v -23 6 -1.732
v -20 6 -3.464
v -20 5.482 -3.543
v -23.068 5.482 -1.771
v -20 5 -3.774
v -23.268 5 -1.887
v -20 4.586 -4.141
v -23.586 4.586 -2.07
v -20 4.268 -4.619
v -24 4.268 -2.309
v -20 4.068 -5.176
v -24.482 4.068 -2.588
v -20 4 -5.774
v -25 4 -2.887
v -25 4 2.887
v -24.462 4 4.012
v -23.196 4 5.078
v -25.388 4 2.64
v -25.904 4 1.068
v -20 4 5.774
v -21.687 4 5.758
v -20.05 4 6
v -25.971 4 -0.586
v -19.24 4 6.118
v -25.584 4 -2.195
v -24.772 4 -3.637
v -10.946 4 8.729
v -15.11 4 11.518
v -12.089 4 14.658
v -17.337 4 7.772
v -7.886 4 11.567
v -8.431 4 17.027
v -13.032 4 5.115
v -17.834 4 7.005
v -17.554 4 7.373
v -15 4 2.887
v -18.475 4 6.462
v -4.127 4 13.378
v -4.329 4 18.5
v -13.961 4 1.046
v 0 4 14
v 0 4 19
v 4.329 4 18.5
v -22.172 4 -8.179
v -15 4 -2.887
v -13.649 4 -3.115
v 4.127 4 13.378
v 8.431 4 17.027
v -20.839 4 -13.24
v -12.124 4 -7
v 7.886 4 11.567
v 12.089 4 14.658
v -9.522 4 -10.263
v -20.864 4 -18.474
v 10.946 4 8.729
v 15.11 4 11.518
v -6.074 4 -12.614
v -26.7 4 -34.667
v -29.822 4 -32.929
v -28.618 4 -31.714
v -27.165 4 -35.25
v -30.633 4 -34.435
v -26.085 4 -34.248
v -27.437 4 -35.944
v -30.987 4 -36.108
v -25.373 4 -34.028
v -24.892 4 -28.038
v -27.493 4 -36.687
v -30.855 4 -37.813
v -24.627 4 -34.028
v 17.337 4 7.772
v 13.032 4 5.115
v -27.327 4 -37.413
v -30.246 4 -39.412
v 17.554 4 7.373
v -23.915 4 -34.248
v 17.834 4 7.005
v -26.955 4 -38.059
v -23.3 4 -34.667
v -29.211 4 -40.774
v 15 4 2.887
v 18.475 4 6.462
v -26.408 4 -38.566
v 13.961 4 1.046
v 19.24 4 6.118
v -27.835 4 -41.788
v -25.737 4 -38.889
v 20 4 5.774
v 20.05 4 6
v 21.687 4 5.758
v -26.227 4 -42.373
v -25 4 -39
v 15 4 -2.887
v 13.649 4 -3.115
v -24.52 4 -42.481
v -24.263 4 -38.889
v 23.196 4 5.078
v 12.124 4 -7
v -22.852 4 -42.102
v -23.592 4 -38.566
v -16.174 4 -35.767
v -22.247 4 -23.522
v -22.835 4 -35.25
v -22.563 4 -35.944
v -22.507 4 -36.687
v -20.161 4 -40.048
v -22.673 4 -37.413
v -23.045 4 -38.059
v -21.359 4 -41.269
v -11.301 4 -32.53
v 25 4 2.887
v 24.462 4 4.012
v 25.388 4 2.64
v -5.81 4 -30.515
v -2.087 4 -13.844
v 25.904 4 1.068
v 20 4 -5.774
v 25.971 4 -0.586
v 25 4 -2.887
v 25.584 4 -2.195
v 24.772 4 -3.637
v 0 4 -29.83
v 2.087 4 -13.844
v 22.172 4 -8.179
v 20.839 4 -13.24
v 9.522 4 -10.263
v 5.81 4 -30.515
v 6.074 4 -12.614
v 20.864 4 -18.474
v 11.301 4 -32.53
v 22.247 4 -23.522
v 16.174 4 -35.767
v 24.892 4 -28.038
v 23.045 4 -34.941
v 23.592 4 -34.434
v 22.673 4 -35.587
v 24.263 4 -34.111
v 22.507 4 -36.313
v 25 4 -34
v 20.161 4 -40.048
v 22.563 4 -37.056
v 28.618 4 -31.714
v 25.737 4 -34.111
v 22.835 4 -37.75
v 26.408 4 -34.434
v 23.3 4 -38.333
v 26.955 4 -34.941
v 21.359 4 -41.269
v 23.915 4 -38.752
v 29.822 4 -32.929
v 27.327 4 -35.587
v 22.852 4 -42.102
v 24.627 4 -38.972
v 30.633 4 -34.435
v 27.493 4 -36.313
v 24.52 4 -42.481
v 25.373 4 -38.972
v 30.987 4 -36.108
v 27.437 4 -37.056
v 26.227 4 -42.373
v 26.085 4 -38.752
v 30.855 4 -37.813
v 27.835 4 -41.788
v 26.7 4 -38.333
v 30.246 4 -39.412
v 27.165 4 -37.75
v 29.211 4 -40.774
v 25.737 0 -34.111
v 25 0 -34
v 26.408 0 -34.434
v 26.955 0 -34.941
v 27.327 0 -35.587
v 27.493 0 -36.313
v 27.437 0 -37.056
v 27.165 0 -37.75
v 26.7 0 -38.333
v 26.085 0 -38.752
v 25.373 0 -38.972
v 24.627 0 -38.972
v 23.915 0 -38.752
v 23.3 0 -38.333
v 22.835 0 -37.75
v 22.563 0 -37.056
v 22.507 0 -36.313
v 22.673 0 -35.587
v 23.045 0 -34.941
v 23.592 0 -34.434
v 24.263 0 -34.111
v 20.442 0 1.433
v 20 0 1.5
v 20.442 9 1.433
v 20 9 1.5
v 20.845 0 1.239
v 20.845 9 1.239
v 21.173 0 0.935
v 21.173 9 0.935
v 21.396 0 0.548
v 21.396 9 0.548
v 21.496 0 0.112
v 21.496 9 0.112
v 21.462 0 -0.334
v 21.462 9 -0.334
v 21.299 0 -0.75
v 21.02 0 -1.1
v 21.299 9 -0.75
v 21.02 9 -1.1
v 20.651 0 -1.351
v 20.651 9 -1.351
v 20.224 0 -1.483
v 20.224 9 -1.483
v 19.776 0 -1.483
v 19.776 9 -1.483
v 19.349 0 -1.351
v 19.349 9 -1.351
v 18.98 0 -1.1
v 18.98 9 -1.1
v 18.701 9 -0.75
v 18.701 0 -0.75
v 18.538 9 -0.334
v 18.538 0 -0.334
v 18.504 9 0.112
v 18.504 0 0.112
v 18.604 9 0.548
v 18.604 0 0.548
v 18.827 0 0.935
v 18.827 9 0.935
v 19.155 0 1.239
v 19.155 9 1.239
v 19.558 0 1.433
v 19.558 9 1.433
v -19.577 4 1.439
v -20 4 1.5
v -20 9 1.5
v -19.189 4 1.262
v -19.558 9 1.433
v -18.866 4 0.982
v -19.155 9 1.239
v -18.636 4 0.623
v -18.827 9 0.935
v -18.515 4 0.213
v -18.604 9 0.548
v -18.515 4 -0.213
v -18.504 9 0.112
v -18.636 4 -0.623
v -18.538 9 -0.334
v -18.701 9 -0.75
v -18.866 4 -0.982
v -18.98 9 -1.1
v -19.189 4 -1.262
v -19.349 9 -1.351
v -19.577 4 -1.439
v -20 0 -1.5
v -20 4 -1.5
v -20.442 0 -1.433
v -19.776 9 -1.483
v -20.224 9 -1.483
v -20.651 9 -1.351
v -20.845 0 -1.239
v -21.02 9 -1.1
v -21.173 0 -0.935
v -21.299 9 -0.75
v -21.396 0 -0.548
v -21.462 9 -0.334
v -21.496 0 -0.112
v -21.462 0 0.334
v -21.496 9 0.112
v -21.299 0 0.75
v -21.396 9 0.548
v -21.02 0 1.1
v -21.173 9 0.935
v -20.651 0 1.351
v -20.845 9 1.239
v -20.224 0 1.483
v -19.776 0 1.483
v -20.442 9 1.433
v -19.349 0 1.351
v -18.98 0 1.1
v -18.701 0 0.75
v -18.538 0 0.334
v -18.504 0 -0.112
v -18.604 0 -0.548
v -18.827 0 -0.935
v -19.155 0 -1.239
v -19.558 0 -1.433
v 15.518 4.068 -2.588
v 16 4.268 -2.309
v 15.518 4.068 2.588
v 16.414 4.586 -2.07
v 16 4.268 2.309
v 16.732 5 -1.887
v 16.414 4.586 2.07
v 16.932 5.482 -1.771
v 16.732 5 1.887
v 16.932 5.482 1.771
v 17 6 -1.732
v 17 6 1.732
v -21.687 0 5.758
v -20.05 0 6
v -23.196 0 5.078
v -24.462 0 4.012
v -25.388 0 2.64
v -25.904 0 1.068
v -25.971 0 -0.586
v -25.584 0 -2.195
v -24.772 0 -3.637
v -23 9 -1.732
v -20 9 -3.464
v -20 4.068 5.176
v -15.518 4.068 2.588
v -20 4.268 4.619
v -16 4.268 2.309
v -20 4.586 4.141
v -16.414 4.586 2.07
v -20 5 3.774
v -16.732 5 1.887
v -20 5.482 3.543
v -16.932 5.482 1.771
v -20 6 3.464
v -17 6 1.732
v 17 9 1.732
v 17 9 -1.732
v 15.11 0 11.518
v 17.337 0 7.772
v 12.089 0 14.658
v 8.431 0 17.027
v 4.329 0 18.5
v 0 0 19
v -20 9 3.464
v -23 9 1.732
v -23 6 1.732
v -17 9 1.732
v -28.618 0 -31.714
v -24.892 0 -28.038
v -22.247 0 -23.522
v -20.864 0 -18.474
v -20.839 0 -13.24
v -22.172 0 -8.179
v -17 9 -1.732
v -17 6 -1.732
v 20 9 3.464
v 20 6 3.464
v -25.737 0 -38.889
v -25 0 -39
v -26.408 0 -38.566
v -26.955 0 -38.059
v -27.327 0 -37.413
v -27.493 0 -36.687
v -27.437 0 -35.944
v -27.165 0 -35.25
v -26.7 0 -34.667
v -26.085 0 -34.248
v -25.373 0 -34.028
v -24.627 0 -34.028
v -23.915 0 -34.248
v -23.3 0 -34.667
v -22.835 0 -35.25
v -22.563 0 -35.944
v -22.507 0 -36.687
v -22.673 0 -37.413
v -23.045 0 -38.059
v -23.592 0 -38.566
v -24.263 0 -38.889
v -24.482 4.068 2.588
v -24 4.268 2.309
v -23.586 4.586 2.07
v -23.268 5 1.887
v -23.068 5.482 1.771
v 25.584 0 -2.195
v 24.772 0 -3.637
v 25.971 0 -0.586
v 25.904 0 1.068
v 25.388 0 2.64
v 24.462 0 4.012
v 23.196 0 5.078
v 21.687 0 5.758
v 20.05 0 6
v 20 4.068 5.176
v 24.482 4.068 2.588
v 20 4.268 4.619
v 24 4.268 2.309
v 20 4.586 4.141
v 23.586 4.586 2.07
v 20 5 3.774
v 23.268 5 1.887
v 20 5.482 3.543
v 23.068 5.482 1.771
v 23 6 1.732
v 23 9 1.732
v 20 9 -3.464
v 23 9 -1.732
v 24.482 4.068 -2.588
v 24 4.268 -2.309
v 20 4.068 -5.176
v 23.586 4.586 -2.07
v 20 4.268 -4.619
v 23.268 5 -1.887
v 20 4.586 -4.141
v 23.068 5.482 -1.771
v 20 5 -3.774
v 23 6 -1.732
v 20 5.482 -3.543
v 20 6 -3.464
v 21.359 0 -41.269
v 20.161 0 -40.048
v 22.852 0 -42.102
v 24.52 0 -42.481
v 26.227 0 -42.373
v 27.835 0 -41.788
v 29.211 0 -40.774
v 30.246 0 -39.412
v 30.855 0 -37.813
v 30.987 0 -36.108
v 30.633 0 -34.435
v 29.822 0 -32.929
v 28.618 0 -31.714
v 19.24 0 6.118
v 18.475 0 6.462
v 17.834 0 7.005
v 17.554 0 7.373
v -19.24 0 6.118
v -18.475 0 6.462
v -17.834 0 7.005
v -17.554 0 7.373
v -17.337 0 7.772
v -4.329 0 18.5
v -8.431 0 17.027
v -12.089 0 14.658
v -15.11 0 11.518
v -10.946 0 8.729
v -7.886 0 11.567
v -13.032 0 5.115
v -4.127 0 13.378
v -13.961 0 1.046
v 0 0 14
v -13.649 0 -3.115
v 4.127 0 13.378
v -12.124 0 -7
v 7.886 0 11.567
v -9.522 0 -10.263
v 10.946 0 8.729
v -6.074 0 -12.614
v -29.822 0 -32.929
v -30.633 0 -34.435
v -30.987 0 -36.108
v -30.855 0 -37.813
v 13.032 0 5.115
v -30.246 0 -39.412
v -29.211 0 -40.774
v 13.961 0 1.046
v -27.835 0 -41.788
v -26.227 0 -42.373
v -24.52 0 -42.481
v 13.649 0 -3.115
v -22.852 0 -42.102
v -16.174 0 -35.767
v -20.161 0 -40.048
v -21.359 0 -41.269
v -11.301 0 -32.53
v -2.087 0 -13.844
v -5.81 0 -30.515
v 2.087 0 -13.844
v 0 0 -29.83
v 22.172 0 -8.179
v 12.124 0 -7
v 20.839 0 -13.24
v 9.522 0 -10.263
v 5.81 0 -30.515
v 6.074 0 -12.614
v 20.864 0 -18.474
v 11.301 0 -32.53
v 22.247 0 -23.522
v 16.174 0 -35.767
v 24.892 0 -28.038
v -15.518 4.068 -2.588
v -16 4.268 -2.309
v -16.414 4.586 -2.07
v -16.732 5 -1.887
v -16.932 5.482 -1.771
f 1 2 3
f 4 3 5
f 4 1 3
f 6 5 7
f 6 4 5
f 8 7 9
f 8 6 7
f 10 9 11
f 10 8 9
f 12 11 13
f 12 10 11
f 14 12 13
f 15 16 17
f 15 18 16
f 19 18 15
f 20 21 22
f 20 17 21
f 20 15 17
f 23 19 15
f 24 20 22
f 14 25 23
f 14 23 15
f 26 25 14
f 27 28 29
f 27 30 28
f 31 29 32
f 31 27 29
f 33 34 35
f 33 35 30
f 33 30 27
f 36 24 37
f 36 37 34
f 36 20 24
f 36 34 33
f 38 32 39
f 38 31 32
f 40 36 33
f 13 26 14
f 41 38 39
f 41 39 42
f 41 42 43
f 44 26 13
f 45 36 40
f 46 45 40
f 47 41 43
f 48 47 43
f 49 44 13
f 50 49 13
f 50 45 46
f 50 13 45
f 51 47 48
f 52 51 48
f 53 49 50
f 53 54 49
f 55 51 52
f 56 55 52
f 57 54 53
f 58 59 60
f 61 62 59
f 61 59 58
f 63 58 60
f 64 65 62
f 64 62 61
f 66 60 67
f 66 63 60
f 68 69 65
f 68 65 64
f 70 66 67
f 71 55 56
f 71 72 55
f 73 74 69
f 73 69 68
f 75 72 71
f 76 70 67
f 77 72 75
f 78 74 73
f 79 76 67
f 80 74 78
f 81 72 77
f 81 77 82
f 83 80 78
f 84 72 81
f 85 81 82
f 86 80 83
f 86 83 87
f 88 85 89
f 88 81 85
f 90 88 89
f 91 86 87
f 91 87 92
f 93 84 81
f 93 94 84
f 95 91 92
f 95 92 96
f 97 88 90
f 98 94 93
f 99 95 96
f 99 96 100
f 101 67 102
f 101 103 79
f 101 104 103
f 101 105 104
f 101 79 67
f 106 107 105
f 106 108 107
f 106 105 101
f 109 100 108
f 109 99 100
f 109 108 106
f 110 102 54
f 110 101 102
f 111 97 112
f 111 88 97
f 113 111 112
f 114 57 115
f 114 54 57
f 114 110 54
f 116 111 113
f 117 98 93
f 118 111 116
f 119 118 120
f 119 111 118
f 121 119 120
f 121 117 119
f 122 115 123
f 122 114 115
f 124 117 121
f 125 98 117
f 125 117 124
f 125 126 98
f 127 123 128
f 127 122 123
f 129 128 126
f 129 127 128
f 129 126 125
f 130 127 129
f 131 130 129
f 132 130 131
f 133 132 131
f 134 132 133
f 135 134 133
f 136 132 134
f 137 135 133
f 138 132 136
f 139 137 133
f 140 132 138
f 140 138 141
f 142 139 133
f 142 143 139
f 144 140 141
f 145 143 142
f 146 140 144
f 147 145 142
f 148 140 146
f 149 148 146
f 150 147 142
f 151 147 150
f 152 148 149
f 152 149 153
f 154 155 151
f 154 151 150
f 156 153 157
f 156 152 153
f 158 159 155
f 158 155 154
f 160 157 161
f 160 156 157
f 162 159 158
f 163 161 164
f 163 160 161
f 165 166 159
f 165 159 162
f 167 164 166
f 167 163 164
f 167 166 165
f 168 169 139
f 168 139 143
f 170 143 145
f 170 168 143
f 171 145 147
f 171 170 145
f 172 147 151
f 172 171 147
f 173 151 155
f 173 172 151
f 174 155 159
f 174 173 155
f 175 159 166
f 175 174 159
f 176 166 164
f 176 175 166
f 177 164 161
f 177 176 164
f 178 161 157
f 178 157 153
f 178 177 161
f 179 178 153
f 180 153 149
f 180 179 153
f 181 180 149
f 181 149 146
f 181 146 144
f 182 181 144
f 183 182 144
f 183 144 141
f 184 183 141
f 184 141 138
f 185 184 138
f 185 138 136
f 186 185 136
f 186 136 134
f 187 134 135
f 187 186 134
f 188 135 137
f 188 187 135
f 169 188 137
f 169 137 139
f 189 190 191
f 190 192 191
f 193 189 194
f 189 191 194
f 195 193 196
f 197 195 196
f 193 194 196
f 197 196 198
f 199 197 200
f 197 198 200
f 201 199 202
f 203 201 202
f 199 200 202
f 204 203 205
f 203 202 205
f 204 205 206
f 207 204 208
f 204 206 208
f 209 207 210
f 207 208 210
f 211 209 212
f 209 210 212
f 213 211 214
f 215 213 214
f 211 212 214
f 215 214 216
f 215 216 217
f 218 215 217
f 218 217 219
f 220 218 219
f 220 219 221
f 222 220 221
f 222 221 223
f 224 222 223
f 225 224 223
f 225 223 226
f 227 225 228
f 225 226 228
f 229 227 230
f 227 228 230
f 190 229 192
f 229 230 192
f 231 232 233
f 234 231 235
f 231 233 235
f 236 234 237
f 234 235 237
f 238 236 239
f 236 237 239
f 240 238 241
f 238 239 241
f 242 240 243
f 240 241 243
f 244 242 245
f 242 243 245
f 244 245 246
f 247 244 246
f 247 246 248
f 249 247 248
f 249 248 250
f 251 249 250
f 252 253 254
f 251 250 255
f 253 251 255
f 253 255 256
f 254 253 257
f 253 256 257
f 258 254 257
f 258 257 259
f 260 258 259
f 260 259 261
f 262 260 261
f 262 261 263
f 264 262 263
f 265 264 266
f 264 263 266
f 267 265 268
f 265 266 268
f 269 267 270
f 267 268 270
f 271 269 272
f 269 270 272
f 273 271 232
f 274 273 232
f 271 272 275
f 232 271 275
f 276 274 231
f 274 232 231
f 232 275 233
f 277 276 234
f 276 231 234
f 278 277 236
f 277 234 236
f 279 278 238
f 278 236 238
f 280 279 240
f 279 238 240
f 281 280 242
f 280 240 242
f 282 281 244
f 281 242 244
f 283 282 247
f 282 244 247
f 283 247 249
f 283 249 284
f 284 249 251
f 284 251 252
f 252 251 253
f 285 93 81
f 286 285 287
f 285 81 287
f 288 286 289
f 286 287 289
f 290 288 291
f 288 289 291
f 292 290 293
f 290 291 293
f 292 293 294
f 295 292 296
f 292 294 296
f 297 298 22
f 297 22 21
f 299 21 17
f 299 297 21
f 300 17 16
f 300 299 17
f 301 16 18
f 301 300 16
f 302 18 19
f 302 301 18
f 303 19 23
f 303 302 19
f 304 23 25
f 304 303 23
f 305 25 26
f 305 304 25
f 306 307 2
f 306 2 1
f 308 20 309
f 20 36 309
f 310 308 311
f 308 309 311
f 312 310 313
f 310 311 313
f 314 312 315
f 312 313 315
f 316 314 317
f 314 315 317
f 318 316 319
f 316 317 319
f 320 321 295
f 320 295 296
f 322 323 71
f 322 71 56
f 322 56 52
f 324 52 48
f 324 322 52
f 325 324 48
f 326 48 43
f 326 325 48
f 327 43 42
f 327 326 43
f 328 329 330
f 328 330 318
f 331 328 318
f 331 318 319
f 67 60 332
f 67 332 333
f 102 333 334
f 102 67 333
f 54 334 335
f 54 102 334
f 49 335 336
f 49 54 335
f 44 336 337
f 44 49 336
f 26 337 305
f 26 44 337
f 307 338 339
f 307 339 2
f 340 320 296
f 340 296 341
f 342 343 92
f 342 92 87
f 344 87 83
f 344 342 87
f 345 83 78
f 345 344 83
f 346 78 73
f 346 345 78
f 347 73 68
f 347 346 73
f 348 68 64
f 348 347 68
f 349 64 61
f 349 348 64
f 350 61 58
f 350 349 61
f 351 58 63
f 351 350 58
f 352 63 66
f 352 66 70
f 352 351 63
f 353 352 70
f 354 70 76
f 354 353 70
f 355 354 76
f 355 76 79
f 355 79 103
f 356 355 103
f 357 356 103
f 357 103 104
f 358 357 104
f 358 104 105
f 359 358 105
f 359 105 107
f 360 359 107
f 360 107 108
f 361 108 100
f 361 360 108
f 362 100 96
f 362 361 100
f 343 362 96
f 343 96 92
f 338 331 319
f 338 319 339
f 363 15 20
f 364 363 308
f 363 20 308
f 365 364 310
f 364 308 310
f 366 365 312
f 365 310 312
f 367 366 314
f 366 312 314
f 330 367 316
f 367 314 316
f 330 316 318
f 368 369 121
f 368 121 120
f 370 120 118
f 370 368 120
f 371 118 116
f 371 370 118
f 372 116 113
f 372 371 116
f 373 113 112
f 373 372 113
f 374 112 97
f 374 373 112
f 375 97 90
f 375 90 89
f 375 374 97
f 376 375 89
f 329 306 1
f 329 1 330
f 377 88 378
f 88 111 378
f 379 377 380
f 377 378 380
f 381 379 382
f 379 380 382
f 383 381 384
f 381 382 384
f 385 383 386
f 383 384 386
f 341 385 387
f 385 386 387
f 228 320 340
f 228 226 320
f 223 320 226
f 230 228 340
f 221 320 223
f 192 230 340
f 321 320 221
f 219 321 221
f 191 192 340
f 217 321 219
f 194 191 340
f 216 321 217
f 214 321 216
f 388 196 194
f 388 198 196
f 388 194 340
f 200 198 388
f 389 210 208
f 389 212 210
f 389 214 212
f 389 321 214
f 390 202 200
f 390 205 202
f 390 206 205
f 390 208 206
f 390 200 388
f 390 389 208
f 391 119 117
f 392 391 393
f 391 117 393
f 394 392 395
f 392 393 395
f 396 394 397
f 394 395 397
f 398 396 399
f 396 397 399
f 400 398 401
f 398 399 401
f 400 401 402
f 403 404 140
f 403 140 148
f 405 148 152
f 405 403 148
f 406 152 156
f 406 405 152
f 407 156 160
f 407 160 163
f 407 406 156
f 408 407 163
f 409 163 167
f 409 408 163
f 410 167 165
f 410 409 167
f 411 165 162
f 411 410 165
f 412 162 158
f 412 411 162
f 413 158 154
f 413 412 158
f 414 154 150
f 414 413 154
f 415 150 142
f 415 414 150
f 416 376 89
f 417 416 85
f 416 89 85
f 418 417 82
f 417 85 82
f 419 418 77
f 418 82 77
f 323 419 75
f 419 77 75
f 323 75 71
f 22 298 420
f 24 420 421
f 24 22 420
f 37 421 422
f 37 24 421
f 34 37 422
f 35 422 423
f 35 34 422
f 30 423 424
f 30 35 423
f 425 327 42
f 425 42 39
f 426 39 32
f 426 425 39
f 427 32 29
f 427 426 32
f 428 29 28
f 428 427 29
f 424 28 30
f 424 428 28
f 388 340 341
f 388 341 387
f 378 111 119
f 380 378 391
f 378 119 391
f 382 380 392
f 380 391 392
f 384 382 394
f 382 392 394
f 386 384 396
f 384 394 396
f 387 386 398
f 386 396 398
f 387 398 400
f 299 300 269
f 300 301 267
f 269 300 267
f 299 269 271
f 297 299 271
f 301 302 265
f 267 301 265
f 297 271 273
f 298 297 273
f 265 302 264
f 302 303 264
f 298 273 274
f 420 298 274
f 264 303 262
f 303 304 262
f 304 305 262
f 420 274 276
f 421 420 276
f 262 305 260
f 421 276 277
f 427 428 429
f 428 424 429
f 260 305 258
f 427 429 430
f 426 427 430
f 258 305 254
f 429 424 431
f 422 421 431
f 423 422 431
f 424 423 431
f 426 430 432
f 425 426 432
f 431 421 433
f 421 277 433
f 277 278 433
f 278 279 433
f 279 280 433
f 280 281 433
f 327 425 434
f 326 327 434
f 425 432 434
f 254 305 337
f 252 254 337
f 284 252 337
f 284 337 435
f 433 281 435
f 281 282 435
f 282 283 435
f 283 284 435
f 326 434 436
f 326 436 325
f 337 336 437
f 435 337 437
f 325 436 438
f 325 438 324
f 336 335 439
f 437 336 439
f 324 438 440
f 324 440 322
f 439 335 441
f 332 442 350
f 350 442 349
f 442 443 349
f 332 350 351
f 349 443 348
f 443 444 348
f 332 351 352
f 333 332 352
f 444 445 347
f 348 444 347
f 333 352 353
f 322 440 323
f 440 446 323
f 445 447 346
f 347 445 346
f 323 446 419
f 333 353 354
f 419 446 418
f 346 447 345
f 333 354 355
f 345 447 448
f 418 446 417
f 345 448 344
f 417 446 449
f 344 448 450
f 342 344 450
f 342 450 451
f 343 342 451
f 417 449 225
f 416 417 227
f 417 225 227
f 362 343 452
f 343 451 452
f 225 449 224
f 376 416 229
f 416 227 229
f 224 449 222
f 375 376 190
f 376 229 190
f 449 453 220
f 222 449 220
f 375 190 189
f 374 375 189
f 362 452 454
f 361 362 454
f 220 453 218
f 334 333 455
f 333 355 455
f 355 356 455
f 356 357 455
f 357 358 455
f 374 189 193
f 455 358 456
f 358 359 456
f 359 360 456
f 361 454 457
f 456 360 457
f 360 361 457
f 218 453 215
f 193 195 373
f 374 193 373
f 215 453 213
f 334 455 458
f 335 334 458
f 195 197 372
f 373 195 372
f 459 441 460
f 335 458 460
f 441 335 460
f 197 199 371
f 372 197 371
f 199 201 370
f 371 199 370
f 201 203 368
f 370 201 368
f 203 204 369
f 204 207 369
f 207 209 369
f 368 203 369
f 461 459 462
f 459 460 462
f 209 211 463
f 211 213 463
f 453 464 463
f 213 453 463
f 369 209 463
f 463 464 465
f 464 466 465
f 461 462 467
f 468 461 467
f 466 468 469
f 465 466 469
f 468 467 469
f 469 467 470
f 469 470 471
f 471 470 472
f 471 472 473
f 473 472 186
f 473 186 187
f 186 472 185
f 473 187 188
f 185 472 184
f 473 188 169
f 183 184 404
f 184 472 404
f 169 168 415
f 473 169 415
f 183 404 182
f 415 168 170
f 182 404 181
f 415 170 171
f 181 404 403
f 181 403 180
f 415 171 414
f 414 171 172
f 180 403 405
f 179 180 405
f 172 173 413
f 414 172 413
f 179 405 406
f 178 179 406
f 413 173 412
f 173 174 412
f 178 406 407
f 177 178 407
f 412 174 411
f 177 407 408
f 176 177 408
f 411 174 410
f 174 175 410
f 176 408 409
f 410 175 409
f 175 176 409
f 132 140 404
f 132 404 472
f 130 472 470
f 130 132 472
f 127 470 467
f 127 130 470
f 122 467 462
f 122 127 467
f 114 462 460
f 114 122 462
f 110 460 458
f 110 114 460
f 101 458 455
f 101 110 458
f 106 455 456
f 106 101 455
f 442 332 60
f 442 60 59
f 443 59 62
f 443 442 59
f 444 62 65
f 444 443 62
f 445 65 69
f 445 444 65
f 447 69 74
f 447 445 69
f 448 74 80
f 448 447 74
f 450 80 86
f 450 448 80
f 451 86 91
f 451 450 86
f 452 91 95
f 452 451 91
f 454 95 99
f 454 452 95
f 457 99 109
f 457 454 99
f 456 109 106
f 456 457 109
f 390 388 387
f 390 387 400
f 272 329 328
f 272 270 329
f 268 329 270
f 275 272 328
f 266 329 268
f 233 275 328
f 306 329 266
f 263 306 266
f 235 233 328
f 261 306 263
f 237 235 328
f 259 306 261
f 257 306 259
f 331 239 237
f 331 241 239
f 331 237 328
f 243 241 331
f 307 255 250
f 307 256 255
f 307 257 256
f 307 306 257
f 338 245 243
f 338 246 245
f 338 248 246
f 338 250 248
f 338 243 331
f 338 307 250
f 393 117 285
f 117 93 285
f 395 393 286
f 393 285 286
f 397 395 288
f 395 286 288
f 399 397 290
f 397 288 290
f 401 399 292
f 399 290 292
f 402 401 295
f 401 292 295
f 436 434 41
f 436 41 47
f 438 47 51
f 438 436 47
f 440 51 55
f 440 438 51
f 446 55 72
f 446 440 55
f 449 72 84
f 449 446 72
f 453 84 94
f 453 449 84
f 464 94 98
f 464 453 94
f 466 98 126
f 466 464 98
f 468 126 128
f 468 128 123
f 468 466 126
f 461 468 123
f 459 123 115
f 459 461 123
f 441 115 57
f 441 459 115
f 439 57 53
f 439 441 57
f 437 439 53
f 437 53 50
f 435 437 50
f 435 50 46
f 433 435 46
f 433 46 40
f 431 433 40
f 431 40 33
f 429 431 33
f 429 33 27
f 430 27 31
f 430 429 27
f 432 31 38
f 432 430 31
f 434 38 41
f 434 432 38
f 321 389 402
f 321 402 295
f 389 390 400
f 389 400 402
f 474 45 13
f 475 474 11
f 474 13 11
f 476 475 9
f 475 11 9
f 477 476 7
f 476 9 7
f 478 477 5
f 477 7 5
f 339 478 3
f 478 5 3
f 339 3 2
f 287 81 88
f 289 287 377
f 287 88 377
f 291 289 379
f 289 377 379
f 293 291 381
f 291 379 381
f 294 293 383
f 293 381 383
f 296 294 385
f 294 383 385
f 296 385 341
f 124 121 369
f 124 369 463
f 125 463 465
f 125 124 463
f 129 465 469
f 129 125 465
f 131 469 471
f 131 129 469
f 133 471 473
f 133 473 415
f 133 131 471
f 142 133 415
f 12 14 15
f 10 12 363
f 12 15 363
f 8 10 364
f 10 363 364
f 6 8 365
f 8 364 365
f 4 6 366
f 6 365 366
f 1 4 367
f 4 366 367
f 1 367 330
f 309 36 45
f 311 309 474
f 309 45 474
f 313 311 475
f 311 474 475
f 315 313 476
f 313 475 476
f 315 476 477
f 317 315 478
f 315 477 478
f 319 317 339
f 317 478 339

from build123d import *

# Parameters (mm, degrees)
SKETCH1_R           = 14
SKETCH1_R_2         = 2.5
BOSS_EXTRUDE1_DEPTH = 4
FILLET1_R           = 3
SKETCH2_R           = 1.5
CUT_EXTRUDE1_DEPTH  = 10
BOSS_EXTRUDE2_START = 5
SKETCH3_R           = 1.5
BOSS_EXTRUDE2_DEPTH = 5
FILLET2_R           = 2
BOSS_EXTRUDE3_DEPTH = 4


with BuildPart() as part:
    # Sketch1 → Boss-Extrude1 (new body)
    with BuildSketch(Plane(origin=(0, 0, 0), x_dir=(1, 0, 0), z_dir=(0, 1, 0))):
        with BuildLine():
            Line((8.126919667, 17.174200905), (19.588621549, 33.908285652))
            ThreePointArc((19.588621549, 33.908285652), (28.390534034, 41.45017969), (24.538801239, 30.517751618))
            Line((24.538801239, 30.517751618), (13.077099357, 13.783666871))
            ThreePointArc((13.077099357, 13.783666871), (16.116177061, 10.06324187), (18.125, 5.699506558))
            ThreePointArc((18.125, 5.699506558), (26, 0), (18.125, -5.699506558))
            ThreePointArc((18.125, -5.699506558), (11.240760103, -15.318136711), (0, -19))
            ThreePointArc((0, -19), (-11.240760103, -15.318136711), (-18.125, -5.699506558))
            ThreePointArc((-18.125, -5.699506558), (-26, 0), (-18.125, 5.699506558))
            ThreePointArc((-18.125, 5.699506558), (-16.116177061, 10.06324187), (-13.077099357, 13.783666871))
            Line((-13.077099357, 13.783666871), (-24.538801239, 30.517751618))
            ThreePointArc((-24.538801239, 30.517751618), (-28.390534034, 41.45017969), (-19.588621549, 33.908285652))
            Line((-19.588621549, 33.908285652), (-8.126919667, 17.174200905))
            ThreePointArc((-8.126919667, 17.174200905), (0, 19), (8.126919667, 17.174200905))
        make_face()
        with Locations(Location((0, 0, 0), (0, 0, 270))):
            Circle(SKETCH1_R, mode=Mode.SUBTRACT)
        with Locations(Location((25, 36.5, 0), (0, 0, 270))):
            Circle(SKETCH1_R_2, mode=Mode.SUBTRACT)
        with Locations(Location((-25, 36.5, 0), (0, 0, 90))):
            Circle(SKETCH1_R_2, mode=Mode.SUBTRACT)
    extrude(amount=BOSS_EXTRUDE1_DEPTH)

    # Fillet1
    fillet1_edges = [part.edges().sort_by_distance(p)[0] for p in [
        (8.126919667, 2, -17.174200905),
        (19.588621549, 2, -33.908285652),
        (24.538801239, 2, -30.517751618),
        (13.077099357, 2, -13.783666871),
        (18.125, 2, 5.699506558),
        (-18.125, 2, 5.699506558),
        (-18.125, 2, -5.699506558),
        (-13.077099357, 2, -13.783666871),
        (-24.538801239, 2, -30.517751618),
        (-19.588621549, 2, -33.908285652),
        (-8.126919667, 2, -17.174200905),
    ]]
    fillet(fillet1_edges, radius=FILLET1_R)

    # Sketch2 → Cut-Extrude1 (cut)
    with BuildSketch(Plane(origin=(0, 4, 0), x_dir=(1, 0, 0), z_dir=(0, 1, 0))):
        with Locations(Location((20, 0, 0), (0, 0, 270))):
            Circle(SKETCH2_R)
        with Locations(Location((-20, 0, 0), (0, 0, 90))):
            Circle(SKETCH2_R)
    extrude(amount=-CUT_EXTRUDE1_DEPTH, mode=Mode.SUBTRACT)

    # Sketch3 → Boss-Extrude2 (add)
    # profile 1 of 2: a face of its own
    with BuildSketch(Plane(origin=(0, 4, 0), x_dir=(1, 0, 0), z_dir=(0, 1, 0)).offset(BOSS_EXTRUDE2_START)):
        Polygon((-20, 3.464101615), (-23, 1.732050808), (-23, -1.732050808), (-20, -3.464101615), (-17, -1.732050808), (-17, 1.732050808), align=None)
        with Locations(Location((-20, 0, 0), (0, 0, 270))):
            Circle(SKETCH3_R, mode=Mode.SUBTRACT)
    # profile 2 of 2: a face of its own
    with BuildSketch(Plane(origin=(0, 4, 0), x_dir=(1, 0, 0), z_dir=(0, 1, 0)).offset(BOSS_EXTRUDE2_START)):
        Polygon((20, 3.464101615), (17, 1.732050808), (17, -1.732050808), (20, -3.464101615), (23, -1.732050808), (23, 1.732050808), align=None)
        with Locations(Location((20, 0, 0), (0, 0, 270))):
            Circle(SKETCH3_R, mode=Mode.SUBTRACT)
    extrude(amount=-BOSS_EXTRUDE2_DEPTH)

    # Fillet2
    fillet2_edges = [part.edges().sort_by_distance(p)[0] for p in [
        (-18.5, 4, -2.598076211),
        (-21.5, 4, -2.598076211),
        (-23, 4, 0),
        (-21.5, 4, 2.598076211),
        (-18.5, 4, 2.598076211),
        (-17, 4, 0),
        (21.5, 4, -2.598076211),
        (18.5, 4, -2.598076211),
        (17, 4, 0),
        (18.5, 4, 2.598076211),
        (21.5, 4, 2.598076211),
        (23, 4, 0),
    ]]
    fillet(fillet2_edges, radius=FILLET2_R)

    # Sketch4 → Boss-Extrude3 (add)
    with BuildSketch(Plane(origin=(0, 4, 0), x_dir=(1, 0, 0), z_dir=(0, 1, 0))):
        with BuildLine():
            ThreePointArc((24.772139191, 3.636851323), (20.864321919, 18.474065491), (28.618293037, 31.7137744))
            ThreePointArc((28.618293037, 31.7137744), (21.354403975, 32.800609697), (20.161290323, 40.047800538))
            ThreePointArc((20.161290323, 40.047800538), (0, 29.83030278), (-20.161290323, 40.047800538))
            ThreePointArc((-20.161290323, 40.047800538), (-21.354403975, 32.800609697), (-28.618293037, 31.7137744))
            ThreePointArc((-28.618293037, 31.7137744), (-20.864321919, 18.474065491), (-24.772139191, 3.636851323))
            ThreePointArc((-24.772139191, 3.636851323), (-19.807252921, 3.994836175), (-15.415783274, 6.338603052))
            ThreePointArc((-15.415783274, 6.338603052), (-9.04861994, 13.254364925), (0, 15.802110673))
            ThreePointArc((0, 15.802110673), (9.04861994, 13.254364925), (15.415783274, 6.338603052))
            ThreePointArc((15.415783274, 6.338603052), (19.807252921, 3.994836175), (24.772139191, 3.636851323))
        make_face()
    extrude(amount=-BOSS_EXTRUDE3_DEPTH)


solid = part.part
